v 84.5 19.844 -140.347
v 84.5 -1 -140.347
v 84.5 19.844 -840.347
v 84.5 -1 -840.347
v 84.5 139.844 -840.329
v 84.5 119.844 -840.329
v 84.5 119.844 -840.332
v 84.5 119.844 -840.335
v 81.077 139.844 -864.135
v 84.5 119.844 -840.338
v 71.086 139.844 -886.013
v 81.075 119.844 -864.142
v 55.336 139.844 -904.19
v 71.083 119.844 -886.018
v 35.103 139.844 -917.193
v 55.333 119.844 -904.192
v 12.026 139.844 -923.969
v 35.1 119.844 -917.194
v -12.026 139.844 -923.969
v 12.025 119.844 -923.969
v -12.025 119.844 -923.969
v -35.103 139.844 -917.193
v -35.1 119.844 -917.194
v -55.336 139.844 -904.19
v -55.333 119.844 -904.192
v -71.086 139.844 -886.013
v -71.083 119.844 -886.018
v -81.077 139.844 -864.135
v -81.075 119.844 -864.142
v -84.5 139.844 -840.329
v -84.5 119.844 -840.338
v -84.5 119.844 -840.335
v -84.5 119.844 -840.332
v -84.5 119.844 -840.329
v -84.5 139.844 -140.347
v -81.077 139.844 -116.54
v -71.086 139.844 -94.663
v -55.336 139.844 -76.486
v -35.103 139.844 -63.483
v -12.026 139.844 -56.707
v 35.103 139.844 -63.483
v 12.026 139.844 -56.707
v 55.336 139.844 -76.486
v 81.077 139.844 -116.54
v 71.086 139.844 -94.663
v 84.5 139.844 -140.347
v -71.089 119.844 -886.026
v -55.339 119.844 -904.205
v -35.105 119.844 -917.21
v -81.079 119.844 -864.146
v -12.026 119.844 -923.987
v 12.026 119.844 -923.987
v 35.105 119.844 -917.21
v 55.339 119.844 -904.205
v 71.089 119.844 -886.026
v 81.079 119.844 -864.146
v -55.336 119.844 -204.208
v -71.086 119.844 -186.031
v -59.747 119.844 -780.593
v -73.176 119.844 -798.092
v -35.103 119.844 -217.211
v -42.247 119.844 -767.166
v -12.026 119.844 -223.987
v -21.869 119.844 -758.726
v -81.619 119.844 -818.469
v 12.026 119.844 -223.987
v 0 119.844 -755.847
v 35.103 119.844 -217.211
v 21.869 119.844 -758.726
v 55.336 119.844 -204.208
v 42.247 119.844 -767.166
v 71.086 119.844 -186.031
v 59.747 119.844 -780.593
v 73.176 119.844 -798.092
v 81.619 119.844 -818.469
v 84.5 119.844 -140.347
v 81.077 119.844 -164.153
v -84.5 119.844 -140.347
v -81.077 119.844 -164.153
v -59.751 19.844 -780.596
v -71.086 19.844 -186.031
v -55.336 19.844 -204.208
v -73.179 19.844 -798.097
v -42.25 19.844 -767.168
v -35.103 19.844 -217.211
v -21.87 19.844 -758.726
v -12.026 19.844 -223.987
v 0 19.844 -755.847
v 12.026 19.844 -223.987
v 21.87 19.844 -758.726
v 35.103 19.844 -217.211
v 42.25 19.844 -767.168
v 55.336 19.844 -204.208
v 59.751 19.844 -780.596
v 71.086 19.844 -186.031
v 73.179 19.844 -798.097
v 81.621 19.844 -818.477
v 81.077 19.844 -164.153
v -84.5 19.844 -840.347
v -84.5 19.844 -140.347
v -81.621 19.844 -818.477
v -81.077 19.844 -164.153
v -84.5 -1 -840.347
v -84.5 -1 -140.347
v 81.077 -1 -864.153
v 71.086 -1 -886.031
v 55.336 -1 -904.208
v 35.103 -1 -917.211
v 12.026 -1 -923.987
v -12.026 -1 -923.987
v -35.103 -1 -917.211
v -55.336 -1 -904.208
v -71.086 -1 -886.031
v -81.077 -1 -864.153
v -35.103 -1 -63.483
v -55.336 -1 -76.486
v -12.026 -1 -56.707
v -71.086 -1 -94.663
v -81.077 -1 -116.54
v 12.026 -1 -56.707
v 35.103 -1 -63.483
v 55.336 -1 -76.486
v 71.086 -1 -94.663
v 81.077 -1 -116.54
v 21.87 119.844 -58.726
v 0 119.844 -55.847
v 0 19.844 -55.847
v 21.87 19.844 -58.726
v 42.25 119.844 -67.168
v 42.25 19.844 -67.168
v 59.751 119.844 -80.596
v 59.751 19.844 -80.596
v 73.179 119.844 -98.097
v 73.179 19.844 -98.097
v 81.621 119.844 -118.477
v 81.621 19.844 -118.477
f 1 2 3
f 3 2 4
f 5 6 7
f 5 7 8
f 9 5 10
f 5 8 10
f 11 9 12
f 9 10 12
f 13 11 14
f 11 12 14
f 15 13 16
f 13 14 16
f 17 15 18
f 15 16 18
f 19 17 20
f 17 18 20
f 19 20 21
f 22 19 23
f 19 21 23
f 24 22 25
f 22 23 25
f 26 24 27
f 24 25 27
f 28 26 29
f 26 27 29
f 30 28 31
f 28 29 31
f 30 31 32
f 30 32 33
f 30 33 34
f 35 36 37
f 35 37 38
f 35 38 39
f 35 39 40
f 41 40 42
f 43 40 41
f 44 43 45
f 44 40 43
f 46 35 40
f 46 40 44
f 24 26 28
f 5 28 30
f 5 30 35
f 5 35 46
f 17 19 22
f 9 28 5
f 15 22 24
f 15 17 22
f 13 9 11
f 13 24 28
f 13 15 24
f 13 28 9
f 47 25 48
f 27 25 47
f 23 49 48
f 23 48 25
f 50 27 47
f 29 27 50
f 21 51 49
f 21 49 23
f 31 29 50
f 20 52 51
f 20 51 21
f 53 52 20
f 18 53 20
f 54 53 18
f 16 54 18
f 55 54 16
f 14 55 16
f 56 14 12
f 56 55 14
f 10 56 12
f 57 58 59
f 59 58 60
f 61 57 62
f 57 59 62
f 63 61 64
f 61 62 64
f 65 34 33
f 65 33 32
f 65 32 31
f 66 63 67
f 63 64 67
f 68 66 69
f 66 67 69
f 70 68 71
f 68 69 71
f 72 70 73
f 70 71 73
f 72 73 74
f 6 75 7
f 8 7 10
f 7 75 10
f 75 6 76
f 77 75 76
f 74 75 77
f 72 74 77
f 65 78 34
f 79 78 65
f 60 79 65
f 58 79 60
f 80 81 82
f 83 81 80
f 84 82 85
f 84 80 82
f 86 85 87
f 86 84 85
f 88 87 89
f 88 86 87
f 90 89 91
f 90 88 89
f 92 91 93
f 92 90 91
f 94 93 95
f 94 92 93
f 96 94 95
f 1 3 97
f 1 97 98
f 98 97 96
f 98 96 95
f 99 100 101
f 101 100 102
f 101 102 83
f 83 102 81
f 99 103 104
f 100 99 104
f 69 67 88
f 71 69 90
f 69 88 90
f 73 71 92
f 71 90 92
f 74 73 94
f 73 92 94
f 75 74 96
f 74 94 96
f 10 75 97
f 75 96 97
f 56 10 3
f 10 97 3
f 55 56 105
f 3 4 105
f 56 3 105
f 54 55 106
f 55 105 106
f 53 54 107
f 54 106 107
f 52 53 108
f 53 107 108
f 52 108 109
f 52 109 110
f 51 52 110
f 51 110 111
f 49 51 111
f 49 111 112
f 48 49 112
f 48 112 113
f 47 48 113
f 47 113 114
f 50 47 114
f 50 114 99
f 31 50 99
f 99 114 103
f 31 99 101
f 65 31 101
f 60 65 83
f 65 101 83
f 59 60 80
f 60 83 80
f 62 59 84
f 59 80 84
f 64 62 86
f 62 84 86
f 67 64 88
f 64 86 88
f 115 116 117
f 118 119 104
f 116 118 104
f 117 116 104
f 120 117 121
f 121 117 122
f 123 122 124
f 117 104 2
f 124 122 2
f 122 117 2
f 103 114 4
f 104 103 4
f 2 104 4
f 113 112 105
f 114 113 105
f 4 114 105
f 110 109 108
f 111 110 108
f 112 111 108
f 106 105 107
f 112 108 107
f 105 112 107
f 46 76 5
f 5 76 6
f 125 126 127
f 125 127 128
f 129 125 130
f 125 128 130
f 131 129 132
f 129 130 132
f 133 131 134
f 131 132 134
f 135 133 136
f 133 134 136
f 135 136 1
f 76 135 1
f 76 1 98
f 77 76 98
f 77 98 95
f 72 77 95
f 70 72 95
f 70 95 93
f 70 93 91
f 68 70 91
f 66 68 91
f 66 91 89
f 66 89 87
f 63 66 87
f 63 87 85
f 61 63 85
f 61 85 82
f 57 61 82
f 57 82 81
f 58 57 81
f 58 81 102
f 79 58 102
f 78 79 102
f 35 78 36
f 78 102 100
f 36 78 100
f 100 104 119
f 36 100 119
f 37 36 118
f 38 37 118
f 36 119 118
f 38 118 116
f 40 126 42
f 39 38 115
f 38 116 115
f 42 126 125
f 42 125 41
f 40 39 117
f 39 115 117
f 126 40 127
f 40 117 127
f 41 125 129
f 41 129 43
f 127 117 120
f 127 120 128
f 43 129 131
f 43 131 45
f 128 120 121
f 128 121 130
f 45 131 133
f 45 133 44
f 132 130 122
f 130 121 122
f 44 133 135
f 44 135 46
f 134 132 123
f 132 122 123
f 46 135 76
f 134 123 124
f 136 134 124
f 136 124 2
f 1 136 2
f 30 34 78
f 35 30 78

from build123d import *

# Parameters (mm, degrees)
BOSS_EXTRUDE3_DEPTH      = 19.844397107
BOSS_EXTRUDE3_DEPTH_BACK = 1
SKETCH4_R                = 84.5
BOSS_EXTRUDE4_DEPTH      = 100
SKETCH6_R                = 84.5
BOSS_EXTRUDE6_DEPTH      = 100
BOSS_EXTRUDE7_DEPTH      = 20


with BuildPart() as part:
    # Sketch3 → Boss-Extrude3 (new, two sides: drawn at the far end of the back side and taken through both)
    with BuildSketch(Plane(origin=(0, 0, 0), x_dir=(1, 0, 0), z_dir=(0, 1, 0)).offset(-BOSS_EXTRUDE3_DEPTH_BACK)):
        with BuildLine():
            ThreePointArc((-84.5, 140.346835397), (0, 55.846835397), (84.5, 140.346835397))
            Line((84.5, 140.346835397), (-84.5, 140.346835397))
        make_face()
        with BuildLine():
            Line((-84.5, 140.346835397), (84.5, 140.346835397))
            ThreePointArc((84.5, 140.346835397), (0, 224.846835397), (-84.5, 140.346835397))
        make_face()
        with BuildLine():
            ThreePointArc((-84.5, 140.346835397), (0, 224.846835397), (84.5, 140.346835397))
            Line((84.5, 140.346835397), (84.5, 840.346835397))
            ThreePointArc((84.5, 840.346835397), (0, 755.846835397), (-84.5, 840.346835397))
            Line((-84.5, 840.346835397), (-84.5, 140.346835397))
        make_face()
        with BuildLine():
            ThreePointArc((-84.5, 840.346835397), (0, 755.846835397), (84.5, 840.346835397))
            Line((84.5, 840.346835397), (-84.5, 840.346835397))
        make_face()
        with BuildLine():
            Line((-84.5, 840.346835397), (84.5, 840.346835397))
            ThreePointArc((84.5, 840.346835397), (0, 924.846835397), (-84.5, 840.346835397))
        make_face()
    extrude(amount=BOSS_EXTRUDE3_DEPTH + BOSS_EXTRUDE3_DEPTH_BACK)

    # Sketch4 → Boss-Extrude4 (add)
    with BuildSketch(Plane(origin=(0, 19.844397107, 0), x_dir=(1, 0, 0), z_dir=(0, 1, 0))):
        with Locations(Location((0, 140.346835397, 0), (0, 0, 270))):
            Circle(SKETCH4_R)
    extrude(amount=BOSS_EXTRUDE4_DEPTH)

    # Sketch6 → Boss-Extrude6 (add)
    with BuildSketch(Plane(origin=(0, 19.844397107, 0), x_dir=(1, 0, 0), z_dir=(0, 1, 0))):
        with Locations(Location((0, 840.346835397, 0), (0, 0, 270))):
            Circle(SKETCH6_R)
    extrude(amount=BOSS_EXTRUDE6_DEPTH)

    # Sketch7 → Boss-Extrude7 (add)
    with BuildSketch(Plane(origin=(0, 119.844397107, 0), x_dir=(1, 0, 0), z_dir=(0, 1, 0))):
        with BuildLine():
            ThreePointArc((-84.5, 140.346835397), (0, 55.846835397), (84.5, 140.346835397))
            Line((84.5, 140.346835397), (-84.5, 140.346835397))
        make_face()
        with BuildLine():
            Line((-84.5, 140.346835397), (84.5, 140.346835397))
            ThreePointArc((84.5, 140.346835397), (0, 224.846835397), (-84.5, 140.346835397))
        make_face()
        with BuildLine():
            ThreePointArc((-84.5, 140.346835397), (0, 224.846835397), (84.5, 140.346835397))
            Line((84.5, 140.346835397), (84.5, 840.32890922))
            ThreePointArc((84.5, 840.32890922), (0, 755.82890922), (-84.5, 840.32890922))
            Line((-84.5, 840.32890922), (-84.5, 140.346835397))
        make_face()
        with BuildLine():
            ThreePointArc((-84.5, 840.32890922), (0, 755.82890922), (84.5, 840.32890922))
            Line((84.5, 840.32890922), (-84.5, 840.32890922))
        make_face()
        with BuildLine():
            Line((-84.5, 840.32890922), (84.5, 840.32890922))
            ThreePointArc((84.5, 840.32890922), (0, 924.82890922), (-84.5, 840.32890922))
        make_face()
    extrude(amount=BOSS_EXTRUDE7_DEPTH)


solid = part.part
